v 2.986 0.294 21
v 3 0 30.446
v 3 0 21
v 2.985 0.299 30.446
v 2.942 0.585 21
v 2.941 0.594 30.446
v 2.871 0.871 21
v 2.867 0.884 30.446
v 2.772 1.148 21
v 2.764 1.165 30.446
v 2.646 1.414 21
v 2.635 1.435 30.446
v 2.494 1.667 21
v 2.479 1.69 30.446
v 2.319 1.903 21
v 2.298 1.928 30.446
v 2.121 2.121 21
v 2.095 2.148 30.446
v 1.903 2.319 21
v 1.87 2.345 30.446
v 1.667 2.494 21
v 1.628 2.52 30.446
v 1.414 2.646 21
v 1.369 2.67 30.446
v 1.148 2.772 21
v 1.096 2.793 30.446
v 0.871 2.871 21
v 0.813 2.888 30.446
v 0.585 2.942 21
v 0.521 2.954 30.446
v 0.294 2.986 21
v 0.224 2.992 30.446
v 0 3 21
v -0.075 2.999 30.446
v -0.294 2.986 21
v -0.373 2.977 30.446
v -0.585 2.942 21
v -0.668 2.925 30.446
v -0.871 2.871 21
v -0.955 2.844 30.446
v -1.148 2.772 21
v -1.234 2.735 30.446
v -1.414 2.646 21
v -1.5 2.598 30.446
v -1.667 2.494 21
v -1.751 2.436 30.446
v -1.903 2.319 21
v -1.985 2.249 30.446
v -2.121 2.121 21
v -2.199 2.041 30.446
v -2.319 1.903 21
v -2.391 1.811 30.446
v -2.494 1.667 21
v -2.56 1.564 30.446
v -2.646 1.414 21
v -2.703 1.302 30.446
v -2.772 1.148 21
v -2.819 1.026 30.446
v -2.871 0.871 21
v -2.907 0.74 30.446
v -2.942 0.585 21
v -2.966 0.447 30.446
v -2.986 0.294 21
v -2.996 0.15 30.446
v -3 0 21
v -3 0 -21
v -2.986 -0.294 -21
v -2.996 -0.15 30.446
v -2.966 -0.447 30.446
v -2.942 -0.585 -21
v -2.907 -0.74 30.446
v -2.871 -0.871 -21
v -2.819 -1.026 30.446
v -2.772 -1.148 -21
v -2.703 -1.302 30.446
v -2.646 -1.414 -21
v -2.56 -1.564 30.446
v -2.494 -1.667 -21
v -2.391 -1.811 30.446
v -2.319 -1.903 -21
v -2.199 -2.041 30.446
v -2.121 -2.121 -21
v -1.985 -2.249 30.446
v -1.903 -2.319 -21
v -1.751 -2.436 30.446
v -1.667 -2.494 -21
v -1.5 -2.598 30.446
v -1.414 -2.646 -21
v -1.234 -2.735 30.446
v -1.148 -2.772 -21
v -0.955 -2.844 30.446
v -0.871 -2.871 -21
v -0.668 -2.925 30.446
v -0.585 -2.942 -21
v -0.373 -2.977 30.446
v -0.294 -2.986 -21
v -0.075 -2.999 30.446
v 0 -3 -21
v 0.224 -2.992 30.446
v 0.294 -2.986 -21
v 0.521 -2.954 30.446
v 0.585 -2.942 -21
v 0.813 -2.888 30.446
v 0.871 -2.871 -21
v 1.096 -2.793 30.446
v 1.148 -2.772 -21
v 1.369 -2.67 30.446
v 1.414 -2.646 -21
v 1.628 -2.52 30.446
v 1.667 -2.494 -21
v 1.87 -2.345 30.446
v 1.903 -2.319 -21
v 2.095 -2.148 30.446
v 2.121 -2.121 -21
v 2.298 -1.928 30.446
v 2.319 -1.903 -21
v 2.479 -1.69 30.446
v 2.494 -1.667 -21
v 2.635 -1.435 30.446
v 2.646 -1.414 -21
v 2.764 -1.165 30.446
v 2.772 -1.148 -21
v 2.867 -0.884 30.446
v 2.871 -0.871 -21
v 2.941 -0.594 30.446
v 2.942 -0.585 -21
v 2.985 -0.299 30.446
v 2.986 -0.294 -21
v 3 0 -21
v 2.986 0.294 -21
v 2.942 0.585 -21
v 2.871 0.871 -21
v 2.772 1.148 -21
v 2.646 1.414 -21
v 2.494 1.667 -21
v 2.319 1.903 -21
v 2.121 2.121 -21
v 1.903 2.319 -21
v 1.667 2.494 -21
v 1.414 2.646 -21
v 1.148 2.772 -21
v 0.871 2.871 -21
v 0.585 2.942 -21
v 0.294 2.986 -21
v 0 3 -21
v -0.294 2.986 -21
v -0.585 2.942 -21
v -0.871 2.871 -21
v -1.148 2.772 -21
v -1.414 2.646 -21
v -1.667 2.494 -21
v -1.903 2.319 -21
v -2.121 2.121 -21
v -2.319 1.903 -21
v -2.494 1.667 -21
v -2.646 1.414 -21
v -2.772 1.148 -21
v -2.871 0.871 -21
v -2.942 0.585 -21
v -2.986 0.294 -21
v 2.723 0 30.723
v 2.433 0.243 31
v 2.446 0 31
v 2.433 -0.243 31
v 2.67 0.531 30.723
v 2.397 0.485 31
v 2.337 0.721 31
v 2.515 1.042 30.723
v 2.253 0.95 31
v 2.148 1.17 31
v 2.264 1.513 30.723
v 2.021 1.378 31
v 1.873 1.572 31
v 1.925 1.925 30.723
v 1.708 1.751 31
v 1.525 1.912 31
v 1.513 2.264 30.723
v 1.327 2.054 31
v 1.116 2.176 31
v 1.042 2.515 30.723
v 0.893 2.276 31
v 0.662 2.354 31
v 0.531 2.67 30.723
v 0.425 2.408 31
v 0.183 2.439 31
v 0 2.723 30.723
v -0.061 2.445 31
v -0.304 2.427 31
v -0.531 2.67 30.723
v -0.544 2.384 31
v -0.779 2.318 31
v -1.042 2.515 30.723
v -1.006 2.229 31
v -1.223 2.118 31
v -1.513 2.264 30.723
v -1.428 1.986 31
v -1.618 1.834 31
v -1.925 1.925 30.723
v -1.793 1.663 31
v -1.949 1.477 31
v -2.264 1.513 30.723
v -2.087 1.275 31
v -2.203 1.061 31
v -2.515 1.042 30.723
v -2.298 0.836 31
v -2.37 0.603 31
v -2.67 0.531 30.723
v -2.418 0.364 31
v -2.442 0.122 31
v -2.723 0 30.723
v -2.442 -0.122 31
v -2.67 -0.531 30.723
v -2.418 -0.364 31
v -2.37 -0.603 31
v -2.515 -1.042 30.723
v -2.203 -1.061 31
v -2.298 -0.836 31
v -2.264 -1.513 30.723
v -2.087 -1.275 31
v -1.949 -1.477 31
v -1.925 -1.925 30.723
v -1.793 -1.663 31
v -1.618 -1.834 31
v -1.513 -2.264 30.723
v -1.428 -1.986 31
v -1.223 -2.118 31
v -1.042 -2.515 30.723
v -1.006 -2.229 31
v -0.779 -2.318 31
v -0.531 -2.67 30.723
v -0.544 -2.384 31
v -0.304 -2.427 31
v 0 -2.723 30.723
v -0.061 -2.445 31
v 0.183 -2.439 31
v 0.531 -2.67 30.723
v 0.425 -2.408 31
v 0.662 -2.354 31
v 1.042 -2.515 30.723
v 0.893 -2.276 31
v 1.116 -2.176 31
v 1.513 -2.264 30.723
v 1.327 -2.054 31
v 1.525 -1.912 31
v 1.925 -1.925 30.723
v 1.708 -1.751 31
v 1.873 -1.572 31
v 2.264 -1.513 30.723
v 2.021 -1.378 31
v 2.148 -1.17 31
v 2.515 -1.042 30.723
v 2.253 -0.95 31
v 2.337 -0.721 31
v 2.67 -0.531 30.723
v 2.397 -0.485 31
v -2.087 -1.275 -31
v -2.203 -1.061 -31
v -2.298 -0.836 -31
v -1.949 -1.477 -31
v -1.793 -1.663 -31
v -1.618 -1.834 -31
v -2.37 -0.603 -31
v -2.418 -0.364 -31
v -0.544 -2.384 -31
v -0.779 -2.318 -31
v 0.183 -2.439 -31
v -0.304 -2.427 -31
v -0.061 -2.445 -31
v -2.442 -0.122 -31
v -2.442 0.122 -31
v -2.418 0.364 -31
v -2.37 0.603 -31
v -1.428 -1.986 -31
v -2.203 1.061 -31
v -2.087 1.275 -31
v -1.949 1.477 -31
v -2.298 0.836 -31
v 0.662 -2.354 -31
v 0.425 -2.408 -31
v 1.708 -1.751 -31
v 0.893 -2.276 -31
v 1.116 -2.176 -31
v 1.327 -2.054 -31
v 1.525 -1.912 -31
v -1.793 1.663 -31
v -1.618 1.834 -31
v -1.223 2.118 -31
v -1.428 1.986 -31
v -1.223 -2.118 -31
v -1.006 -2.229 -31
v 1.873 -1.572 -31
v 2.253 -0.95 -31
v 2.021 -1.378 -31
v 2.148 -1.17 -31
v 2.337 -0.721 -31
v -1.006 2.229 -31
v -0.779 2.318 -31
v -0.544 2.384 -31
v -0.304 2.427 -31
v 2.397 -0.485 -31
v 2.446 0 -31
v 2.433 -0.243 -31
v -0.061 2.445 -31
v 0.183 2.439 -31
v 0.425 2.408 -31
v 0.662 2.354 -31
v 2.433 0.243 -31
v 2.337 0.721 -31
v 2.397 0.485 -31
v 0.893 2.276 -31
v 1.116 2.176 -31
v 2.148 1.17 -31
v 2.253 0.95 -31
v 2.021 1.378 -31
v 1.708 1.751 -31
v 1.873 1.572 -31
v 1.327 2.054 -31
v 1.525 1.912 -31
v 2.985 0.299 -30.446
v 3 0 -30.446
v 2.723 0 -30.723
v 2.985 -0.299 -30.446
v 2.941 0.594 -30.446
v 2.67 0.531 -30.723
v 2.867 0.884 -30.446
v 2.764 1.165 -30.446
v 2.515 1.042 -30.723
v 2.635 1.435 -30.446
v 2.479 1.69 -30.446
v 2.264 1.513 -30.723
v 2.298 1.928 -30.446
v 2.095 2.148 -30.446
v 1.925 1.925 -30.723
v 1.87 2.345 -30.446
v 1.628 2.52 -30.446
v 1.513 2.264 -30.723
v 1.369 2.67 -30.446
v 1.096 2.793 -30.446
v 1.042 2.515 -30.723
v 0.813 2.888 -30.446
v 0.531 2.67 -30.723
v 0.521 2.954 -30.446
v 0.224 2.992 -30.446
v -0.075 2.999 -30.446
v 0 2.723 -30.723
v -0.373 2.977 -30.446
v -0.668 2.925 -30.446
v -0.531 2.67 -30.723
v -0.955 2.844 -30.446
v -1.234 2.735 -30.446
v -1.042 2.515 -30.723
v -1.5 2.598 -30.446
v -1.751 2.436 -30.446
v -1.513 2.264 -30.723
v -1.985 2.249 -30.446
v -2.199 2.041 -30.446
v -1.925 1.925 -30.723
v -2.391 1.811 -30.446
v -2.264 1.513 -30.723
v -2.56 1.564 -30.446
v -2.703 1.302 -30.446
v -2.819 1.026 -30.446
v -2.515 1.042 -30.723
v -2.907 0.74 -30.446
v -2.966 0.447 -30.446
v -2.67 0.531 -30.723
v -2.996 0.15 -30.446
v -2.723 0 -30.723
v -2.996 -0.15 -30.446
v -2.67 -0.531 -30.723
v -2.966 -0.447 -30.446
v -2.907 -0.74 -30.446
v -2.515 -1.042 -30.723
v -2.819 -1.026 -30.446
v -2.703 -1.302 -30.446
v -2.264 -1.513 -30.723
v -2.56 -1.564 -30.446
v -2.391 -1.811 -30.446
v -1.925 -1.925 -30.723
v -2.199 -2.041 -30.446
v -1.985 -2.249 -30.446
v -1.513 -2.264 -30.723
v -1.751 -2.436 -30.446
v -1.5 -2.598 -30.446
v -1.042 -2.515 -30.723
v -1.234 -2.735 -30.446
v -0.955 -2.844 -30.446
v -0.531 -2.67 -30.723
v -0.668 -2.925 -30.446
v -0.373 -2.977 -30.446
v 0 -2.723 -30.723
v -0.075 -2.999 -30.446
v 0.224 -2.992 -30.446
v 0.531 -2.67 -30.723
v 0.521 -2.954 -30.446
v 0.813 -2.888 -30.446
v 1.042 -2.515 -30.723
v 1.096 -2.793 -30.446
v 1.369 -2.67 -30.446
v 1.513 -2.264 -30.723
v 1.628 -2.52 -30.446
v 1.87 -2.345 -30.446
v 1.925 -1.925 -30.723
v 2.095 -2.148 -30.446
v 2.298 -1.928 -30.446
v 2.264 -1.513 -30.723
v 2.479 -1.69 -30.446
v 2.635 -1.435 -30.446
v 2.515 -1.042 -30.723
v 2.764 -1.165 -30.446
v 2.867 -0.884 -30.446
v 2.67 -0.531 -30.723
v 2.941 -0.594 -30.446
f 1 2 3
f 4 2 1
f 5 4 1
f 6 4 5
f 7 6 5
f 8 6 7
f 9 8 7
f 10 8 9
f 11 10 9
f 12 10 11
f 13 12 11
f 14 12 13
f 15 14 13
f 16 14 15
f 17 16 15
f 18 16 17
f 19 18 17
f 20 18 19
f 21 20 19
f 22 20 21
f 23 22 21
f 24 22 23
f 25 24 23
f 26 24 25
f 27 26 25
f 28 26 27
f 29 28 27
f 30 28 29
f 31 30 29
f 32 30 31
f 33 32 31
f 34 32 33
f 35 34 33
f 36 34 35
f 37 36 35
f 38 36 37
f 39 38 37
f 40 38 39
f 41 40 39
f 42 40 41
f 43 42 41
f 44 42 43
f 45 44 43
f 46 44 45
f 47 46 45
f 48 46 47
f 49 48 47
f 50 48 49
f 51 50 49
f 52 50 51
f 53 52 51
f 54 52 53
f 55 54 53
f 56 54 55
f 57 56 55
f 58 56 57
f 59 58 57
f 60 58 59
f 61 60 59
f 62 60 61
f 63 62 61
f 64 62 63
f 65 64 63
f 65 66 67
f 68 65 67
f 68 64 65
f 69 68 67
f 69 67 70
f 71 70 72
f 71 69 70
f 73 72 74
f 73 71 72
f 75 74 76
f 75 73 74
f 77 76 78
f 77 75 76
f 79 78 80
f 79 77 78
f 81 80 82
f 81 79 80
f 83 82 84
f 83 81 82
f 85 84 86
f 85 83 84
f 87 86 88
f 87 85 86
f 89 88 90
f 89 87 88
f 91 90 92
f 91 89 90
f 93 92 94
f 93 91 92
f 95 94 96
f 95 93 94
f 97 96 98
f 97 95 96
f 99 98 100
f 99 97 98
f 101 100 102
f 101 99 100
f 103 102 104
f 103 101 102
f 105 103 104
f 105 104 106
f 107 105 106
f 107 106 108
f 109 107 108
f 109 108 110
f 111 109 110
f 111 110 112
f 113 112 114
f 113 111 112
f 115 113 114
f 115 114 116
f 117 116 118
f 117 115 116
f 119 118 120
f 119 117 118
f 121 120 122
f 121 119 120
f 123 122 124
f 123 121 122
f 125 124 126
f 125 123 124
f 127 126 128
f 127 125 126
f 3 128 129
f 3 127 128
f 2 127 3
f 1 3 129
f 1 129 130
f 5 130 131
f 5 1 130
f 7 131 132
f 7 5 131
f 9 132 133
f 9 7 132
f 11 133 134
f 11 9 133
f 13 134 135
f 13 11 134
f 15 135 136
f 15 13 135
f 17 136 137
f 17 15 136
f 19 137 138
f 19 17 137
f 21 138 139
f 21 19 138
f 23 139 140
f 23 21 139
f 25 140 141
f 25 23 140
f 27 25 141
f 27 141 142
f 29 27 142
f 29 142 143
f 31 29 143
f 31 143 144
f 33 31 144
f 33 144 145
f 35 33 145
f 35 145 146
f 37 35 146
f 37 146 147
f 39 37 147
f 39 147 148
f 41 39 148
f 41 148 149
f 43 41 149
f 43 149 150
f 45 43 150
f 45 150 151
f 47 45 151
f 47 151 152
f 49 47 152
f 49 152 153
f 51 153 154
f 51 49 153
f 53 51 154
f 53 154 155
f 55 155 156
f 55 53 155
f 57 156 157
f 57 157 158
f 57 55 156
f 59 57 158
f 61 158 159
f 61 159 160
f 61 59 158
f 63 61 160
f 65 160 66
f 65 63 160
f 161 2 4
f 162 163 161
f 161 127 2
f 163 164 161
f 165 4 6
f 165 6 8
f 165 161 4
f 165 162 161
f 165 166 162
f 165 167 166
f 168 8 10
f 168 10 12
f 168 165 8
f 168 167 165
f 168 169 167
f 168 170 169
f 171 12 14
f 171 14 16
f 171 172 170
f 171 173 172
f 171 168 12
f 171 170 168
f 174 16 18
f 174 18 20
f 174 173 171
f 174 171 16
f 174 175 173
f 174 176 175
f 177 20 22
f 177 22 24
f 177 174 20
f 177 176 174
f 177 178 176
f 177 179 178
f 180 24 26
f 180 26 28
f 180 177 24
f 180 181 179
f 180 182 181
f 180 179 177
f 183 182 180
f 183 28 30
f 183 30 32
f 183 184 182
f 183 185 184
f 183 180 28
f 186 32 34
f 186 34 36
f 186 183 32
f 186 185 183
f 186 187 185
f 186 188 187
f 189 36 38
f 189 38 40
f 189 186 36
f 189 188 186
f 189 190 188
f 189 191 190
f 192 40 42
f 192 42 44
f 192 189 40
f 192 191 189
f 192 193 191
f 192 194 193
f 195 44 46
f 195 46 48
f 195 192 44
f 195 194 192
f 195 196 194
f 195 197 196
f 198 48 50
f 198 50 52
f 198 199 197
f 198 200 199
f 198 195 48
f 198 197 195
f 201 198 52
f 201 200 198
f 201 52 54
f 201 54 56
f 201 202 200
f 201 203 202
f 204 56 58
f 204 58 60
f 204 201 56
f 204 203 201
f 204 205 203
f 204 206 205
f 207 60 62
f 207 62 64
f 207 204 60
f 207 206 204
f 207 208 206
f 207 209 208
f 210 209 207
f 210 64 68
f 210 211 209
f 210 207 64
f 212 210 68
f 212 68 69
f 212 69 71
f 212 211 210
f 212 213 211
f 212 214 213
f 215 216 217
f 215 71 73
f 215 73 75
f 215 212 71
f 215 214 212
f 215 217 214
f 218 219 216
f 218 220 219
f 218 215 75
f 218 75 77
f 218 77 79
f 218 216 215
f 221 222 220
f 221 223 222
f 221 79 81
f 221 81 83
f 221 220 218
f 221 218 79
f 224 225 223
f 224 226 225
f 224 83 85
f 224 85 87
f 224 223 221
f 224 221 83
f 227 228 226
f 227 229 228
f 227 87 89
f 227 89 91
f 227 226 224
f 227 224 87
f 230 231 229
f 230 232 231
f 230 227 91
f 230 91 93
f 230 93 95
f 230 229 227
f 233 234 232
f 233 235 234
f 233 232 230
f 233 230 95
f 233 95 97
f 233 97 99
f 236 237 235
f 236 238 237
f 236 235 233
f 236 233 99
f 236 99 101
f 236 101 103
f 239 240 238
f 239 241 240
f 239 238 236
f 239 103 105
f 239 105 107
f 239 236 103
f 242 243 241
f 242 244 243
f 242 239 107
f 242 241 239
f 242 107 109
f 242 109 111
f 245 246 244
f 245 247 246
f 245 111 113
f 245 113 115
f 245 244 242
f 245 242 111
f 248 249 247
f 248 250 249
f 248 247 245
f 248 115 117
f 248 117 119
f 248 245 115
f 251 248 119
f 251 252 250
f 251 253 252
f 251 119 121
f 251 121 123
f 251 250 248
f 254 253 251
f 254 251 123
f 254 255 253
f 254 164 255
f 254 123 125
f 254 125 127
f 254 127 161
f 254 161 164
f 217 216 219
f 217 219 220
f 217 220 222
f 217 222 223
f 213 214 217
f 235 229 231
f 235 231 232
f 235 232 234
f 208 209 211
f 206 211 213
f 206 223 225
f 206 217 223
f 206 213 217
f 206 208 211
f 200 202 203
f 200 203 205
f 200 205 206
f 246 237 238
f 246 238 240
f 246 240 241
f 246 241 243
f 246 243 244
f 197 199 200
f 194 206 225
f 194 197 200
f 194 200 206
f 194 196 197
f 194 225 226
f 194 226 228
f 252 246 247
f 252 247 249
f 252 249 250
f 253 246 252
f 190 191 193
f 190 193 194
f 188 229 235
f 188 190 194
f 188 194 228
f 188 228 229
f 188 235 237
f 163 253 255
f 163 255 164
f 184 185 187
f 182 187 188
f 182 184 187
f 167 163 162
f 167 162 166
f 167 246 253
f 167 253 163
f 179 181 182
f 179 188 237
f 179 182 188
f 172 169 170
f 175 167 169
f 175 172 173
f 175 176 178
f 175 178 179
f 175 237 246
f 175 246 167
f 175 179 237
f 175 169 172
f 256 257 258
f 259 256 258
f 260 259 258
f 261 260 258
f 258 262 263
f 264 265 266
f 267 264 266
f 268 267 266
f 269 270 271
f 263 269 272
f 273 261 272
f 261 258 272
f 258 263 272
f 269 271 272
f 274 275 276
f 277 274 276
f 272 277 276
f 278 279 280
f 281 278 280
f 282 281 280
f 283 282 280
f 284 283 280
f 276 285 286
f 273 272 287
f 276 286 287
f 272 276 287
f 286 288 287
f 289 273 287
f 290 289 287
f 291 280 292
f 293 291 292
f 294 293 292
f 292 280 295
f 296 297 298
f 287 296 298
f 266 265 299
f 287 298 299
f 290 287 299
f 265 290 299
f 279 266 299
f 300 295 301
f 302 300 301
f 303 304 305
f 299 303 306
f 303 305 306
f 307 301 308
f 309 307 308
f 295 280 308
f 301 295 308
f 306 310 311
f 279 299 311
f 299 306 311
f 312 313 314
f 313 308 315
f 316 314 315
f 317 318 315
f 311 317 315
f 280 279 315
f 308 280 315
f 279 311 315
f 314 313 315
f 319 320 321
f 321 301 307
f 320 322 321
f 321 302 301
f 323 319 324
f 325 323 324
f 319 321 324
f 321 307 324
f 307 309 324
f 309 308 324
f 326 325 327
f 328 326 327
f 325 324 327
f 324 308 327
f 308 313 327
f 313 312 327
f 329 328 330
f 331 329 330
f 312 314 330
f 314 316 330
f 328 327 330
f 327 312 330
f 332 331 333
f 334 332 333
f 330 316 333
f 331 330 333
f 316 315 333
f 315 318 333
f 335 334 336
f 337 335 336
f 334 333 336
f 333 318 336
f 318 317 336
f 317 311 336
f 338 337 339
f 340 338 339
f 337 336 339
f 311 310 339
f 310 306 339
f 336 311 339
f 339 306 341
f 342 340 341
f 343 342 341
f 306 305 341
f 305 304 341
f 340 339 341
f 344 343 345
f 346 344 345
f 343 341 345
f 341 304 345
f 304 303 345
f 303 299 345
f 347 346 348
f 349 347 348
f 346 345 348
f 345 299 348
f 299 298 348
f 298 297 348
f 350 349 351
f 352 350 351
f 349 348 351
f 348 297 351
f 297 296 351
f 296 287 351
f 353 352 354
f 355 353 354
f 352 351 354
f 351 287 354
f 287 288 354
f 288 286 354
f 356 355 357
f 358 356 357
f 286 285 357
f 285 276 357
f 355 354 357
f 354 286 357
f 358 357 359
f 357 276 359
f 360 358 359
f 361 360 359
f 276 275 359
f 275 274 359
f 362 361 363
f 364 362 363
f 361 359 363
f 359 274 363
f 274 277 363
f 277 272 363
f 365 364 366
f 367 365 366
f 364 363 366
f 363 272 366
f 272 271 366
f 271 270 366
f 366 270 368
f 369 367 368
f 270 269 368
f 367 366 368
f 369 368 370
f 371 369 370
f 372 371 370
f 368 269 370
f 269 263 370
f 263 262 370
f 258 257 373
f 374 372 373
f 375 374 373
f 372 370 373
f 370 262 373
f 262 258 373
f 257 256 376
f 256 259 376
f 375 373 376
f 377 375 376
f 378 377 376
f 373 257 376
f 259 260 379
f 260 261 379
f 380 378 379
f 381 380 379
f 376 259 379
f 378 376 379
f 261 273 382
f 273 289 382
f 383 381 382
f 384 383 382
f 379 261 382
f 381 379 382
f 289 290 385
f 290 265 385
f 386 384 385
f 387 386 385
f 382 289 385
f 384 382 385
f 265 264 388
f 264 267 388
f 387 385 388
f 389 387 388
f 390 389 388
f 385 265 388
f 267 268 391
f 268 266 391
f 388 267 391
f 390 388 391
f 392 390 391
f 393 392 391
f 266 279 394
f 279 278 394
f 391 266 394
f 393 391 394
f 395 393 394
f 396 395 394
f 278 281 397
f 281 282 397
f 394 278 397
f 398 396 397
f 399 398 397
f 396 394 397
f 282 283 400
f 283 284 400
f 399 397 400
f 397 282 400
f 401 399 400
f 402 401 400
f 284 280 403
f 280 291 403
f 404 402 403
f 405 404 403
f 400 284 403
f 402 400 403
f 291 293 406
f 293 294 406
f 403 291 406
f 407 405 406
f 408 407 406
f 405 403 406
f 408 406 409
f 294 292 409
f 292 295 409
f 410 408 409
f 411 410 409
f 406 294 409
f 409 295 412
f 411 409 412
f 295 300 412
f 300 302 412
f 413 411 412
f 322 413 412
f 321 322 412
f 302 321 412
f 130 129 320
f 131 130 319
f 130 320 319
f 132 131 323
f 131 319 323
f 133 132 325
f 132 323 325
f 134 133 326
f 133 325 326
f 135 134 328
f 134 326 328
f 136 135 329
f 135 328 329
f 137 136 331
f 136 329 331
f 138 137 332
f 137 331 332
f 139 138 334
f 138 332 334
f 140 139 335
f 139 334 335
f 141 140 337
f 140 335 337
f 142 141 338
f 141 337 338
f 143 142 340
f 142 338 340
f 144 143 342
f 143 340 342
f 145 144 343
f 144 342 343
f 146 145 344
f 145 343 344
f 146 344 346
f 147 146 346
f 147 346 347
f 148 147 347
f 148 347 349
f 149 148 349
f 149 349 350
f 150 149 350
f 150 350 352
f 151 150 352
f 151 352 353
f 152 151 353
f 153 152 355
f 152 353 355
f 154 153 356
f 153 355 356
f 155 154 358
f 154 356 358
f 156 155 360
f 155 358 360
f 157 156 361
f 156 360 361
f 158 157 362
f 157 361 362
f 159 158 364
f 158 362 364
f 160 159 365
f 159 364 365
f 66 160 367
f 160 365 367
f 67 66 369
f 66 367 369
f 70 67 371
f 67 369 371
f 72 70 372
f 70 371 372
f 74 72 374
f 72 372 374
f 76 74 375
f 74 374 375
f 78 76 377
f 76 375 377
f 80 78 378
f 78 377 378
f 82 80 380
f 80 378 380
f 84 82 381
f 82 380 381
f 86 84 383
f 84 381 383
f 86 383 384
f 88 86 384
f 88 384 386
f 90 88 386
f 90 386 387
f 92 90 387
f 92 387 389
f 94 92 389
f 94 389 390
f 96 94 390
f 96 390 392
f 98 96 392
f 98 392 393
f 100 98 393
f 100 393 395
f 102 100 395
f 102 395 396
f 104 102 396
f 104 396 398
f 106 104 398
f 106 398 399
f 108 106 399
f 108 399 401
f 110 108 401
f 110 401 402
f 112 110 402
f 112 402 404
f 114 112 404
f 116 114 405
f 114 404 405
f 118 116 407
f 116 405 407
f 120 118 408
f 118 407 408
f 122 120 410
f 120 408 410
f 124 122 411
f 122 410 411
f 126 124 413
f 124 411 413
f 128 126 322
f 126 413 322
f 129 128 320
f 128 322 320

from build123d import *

# Parameters (mm, degrees)
SKETCH1_R           = 3
BOSS_EXTRUDE1_DEPTH = 21


# Read off the part's stored shape, not the designer's step: M6x1.0 Machine Threads Stud1
with BuildPart() as part:
    # Sketch1 → Boss-Extrude1 (new, symmetric)
    with BuildSketch(Plane.XY):
        with Locations(Location((0, 0, 0), (0, 0, 180))):
            Circle(SKETCH1_R)
    extrude(amount=BOSS_EXTRUDE1_DEPTH, both=True)

    # M6x1.0 Machine Threads Stud1 outline → M6x1.0 Machine Threads Stud1 (revolve)
    with BuildSketch(Plane.XZ):
        Polygon((3, 21), (3, 30.4455), (2.4455, 31), (0, 31), (0, 21), align=None)
    m6x1_0_machine_threads_stud1 = revolve(axis=Axis((0, 0, 0), (0, 0, 1)))

    # Mirror1: M6x1.0 Machine Threads Stud1 across plane
    add(m6x1_0_machine_threads_stud1.mirror(Plane.XY))


solid = part.part
